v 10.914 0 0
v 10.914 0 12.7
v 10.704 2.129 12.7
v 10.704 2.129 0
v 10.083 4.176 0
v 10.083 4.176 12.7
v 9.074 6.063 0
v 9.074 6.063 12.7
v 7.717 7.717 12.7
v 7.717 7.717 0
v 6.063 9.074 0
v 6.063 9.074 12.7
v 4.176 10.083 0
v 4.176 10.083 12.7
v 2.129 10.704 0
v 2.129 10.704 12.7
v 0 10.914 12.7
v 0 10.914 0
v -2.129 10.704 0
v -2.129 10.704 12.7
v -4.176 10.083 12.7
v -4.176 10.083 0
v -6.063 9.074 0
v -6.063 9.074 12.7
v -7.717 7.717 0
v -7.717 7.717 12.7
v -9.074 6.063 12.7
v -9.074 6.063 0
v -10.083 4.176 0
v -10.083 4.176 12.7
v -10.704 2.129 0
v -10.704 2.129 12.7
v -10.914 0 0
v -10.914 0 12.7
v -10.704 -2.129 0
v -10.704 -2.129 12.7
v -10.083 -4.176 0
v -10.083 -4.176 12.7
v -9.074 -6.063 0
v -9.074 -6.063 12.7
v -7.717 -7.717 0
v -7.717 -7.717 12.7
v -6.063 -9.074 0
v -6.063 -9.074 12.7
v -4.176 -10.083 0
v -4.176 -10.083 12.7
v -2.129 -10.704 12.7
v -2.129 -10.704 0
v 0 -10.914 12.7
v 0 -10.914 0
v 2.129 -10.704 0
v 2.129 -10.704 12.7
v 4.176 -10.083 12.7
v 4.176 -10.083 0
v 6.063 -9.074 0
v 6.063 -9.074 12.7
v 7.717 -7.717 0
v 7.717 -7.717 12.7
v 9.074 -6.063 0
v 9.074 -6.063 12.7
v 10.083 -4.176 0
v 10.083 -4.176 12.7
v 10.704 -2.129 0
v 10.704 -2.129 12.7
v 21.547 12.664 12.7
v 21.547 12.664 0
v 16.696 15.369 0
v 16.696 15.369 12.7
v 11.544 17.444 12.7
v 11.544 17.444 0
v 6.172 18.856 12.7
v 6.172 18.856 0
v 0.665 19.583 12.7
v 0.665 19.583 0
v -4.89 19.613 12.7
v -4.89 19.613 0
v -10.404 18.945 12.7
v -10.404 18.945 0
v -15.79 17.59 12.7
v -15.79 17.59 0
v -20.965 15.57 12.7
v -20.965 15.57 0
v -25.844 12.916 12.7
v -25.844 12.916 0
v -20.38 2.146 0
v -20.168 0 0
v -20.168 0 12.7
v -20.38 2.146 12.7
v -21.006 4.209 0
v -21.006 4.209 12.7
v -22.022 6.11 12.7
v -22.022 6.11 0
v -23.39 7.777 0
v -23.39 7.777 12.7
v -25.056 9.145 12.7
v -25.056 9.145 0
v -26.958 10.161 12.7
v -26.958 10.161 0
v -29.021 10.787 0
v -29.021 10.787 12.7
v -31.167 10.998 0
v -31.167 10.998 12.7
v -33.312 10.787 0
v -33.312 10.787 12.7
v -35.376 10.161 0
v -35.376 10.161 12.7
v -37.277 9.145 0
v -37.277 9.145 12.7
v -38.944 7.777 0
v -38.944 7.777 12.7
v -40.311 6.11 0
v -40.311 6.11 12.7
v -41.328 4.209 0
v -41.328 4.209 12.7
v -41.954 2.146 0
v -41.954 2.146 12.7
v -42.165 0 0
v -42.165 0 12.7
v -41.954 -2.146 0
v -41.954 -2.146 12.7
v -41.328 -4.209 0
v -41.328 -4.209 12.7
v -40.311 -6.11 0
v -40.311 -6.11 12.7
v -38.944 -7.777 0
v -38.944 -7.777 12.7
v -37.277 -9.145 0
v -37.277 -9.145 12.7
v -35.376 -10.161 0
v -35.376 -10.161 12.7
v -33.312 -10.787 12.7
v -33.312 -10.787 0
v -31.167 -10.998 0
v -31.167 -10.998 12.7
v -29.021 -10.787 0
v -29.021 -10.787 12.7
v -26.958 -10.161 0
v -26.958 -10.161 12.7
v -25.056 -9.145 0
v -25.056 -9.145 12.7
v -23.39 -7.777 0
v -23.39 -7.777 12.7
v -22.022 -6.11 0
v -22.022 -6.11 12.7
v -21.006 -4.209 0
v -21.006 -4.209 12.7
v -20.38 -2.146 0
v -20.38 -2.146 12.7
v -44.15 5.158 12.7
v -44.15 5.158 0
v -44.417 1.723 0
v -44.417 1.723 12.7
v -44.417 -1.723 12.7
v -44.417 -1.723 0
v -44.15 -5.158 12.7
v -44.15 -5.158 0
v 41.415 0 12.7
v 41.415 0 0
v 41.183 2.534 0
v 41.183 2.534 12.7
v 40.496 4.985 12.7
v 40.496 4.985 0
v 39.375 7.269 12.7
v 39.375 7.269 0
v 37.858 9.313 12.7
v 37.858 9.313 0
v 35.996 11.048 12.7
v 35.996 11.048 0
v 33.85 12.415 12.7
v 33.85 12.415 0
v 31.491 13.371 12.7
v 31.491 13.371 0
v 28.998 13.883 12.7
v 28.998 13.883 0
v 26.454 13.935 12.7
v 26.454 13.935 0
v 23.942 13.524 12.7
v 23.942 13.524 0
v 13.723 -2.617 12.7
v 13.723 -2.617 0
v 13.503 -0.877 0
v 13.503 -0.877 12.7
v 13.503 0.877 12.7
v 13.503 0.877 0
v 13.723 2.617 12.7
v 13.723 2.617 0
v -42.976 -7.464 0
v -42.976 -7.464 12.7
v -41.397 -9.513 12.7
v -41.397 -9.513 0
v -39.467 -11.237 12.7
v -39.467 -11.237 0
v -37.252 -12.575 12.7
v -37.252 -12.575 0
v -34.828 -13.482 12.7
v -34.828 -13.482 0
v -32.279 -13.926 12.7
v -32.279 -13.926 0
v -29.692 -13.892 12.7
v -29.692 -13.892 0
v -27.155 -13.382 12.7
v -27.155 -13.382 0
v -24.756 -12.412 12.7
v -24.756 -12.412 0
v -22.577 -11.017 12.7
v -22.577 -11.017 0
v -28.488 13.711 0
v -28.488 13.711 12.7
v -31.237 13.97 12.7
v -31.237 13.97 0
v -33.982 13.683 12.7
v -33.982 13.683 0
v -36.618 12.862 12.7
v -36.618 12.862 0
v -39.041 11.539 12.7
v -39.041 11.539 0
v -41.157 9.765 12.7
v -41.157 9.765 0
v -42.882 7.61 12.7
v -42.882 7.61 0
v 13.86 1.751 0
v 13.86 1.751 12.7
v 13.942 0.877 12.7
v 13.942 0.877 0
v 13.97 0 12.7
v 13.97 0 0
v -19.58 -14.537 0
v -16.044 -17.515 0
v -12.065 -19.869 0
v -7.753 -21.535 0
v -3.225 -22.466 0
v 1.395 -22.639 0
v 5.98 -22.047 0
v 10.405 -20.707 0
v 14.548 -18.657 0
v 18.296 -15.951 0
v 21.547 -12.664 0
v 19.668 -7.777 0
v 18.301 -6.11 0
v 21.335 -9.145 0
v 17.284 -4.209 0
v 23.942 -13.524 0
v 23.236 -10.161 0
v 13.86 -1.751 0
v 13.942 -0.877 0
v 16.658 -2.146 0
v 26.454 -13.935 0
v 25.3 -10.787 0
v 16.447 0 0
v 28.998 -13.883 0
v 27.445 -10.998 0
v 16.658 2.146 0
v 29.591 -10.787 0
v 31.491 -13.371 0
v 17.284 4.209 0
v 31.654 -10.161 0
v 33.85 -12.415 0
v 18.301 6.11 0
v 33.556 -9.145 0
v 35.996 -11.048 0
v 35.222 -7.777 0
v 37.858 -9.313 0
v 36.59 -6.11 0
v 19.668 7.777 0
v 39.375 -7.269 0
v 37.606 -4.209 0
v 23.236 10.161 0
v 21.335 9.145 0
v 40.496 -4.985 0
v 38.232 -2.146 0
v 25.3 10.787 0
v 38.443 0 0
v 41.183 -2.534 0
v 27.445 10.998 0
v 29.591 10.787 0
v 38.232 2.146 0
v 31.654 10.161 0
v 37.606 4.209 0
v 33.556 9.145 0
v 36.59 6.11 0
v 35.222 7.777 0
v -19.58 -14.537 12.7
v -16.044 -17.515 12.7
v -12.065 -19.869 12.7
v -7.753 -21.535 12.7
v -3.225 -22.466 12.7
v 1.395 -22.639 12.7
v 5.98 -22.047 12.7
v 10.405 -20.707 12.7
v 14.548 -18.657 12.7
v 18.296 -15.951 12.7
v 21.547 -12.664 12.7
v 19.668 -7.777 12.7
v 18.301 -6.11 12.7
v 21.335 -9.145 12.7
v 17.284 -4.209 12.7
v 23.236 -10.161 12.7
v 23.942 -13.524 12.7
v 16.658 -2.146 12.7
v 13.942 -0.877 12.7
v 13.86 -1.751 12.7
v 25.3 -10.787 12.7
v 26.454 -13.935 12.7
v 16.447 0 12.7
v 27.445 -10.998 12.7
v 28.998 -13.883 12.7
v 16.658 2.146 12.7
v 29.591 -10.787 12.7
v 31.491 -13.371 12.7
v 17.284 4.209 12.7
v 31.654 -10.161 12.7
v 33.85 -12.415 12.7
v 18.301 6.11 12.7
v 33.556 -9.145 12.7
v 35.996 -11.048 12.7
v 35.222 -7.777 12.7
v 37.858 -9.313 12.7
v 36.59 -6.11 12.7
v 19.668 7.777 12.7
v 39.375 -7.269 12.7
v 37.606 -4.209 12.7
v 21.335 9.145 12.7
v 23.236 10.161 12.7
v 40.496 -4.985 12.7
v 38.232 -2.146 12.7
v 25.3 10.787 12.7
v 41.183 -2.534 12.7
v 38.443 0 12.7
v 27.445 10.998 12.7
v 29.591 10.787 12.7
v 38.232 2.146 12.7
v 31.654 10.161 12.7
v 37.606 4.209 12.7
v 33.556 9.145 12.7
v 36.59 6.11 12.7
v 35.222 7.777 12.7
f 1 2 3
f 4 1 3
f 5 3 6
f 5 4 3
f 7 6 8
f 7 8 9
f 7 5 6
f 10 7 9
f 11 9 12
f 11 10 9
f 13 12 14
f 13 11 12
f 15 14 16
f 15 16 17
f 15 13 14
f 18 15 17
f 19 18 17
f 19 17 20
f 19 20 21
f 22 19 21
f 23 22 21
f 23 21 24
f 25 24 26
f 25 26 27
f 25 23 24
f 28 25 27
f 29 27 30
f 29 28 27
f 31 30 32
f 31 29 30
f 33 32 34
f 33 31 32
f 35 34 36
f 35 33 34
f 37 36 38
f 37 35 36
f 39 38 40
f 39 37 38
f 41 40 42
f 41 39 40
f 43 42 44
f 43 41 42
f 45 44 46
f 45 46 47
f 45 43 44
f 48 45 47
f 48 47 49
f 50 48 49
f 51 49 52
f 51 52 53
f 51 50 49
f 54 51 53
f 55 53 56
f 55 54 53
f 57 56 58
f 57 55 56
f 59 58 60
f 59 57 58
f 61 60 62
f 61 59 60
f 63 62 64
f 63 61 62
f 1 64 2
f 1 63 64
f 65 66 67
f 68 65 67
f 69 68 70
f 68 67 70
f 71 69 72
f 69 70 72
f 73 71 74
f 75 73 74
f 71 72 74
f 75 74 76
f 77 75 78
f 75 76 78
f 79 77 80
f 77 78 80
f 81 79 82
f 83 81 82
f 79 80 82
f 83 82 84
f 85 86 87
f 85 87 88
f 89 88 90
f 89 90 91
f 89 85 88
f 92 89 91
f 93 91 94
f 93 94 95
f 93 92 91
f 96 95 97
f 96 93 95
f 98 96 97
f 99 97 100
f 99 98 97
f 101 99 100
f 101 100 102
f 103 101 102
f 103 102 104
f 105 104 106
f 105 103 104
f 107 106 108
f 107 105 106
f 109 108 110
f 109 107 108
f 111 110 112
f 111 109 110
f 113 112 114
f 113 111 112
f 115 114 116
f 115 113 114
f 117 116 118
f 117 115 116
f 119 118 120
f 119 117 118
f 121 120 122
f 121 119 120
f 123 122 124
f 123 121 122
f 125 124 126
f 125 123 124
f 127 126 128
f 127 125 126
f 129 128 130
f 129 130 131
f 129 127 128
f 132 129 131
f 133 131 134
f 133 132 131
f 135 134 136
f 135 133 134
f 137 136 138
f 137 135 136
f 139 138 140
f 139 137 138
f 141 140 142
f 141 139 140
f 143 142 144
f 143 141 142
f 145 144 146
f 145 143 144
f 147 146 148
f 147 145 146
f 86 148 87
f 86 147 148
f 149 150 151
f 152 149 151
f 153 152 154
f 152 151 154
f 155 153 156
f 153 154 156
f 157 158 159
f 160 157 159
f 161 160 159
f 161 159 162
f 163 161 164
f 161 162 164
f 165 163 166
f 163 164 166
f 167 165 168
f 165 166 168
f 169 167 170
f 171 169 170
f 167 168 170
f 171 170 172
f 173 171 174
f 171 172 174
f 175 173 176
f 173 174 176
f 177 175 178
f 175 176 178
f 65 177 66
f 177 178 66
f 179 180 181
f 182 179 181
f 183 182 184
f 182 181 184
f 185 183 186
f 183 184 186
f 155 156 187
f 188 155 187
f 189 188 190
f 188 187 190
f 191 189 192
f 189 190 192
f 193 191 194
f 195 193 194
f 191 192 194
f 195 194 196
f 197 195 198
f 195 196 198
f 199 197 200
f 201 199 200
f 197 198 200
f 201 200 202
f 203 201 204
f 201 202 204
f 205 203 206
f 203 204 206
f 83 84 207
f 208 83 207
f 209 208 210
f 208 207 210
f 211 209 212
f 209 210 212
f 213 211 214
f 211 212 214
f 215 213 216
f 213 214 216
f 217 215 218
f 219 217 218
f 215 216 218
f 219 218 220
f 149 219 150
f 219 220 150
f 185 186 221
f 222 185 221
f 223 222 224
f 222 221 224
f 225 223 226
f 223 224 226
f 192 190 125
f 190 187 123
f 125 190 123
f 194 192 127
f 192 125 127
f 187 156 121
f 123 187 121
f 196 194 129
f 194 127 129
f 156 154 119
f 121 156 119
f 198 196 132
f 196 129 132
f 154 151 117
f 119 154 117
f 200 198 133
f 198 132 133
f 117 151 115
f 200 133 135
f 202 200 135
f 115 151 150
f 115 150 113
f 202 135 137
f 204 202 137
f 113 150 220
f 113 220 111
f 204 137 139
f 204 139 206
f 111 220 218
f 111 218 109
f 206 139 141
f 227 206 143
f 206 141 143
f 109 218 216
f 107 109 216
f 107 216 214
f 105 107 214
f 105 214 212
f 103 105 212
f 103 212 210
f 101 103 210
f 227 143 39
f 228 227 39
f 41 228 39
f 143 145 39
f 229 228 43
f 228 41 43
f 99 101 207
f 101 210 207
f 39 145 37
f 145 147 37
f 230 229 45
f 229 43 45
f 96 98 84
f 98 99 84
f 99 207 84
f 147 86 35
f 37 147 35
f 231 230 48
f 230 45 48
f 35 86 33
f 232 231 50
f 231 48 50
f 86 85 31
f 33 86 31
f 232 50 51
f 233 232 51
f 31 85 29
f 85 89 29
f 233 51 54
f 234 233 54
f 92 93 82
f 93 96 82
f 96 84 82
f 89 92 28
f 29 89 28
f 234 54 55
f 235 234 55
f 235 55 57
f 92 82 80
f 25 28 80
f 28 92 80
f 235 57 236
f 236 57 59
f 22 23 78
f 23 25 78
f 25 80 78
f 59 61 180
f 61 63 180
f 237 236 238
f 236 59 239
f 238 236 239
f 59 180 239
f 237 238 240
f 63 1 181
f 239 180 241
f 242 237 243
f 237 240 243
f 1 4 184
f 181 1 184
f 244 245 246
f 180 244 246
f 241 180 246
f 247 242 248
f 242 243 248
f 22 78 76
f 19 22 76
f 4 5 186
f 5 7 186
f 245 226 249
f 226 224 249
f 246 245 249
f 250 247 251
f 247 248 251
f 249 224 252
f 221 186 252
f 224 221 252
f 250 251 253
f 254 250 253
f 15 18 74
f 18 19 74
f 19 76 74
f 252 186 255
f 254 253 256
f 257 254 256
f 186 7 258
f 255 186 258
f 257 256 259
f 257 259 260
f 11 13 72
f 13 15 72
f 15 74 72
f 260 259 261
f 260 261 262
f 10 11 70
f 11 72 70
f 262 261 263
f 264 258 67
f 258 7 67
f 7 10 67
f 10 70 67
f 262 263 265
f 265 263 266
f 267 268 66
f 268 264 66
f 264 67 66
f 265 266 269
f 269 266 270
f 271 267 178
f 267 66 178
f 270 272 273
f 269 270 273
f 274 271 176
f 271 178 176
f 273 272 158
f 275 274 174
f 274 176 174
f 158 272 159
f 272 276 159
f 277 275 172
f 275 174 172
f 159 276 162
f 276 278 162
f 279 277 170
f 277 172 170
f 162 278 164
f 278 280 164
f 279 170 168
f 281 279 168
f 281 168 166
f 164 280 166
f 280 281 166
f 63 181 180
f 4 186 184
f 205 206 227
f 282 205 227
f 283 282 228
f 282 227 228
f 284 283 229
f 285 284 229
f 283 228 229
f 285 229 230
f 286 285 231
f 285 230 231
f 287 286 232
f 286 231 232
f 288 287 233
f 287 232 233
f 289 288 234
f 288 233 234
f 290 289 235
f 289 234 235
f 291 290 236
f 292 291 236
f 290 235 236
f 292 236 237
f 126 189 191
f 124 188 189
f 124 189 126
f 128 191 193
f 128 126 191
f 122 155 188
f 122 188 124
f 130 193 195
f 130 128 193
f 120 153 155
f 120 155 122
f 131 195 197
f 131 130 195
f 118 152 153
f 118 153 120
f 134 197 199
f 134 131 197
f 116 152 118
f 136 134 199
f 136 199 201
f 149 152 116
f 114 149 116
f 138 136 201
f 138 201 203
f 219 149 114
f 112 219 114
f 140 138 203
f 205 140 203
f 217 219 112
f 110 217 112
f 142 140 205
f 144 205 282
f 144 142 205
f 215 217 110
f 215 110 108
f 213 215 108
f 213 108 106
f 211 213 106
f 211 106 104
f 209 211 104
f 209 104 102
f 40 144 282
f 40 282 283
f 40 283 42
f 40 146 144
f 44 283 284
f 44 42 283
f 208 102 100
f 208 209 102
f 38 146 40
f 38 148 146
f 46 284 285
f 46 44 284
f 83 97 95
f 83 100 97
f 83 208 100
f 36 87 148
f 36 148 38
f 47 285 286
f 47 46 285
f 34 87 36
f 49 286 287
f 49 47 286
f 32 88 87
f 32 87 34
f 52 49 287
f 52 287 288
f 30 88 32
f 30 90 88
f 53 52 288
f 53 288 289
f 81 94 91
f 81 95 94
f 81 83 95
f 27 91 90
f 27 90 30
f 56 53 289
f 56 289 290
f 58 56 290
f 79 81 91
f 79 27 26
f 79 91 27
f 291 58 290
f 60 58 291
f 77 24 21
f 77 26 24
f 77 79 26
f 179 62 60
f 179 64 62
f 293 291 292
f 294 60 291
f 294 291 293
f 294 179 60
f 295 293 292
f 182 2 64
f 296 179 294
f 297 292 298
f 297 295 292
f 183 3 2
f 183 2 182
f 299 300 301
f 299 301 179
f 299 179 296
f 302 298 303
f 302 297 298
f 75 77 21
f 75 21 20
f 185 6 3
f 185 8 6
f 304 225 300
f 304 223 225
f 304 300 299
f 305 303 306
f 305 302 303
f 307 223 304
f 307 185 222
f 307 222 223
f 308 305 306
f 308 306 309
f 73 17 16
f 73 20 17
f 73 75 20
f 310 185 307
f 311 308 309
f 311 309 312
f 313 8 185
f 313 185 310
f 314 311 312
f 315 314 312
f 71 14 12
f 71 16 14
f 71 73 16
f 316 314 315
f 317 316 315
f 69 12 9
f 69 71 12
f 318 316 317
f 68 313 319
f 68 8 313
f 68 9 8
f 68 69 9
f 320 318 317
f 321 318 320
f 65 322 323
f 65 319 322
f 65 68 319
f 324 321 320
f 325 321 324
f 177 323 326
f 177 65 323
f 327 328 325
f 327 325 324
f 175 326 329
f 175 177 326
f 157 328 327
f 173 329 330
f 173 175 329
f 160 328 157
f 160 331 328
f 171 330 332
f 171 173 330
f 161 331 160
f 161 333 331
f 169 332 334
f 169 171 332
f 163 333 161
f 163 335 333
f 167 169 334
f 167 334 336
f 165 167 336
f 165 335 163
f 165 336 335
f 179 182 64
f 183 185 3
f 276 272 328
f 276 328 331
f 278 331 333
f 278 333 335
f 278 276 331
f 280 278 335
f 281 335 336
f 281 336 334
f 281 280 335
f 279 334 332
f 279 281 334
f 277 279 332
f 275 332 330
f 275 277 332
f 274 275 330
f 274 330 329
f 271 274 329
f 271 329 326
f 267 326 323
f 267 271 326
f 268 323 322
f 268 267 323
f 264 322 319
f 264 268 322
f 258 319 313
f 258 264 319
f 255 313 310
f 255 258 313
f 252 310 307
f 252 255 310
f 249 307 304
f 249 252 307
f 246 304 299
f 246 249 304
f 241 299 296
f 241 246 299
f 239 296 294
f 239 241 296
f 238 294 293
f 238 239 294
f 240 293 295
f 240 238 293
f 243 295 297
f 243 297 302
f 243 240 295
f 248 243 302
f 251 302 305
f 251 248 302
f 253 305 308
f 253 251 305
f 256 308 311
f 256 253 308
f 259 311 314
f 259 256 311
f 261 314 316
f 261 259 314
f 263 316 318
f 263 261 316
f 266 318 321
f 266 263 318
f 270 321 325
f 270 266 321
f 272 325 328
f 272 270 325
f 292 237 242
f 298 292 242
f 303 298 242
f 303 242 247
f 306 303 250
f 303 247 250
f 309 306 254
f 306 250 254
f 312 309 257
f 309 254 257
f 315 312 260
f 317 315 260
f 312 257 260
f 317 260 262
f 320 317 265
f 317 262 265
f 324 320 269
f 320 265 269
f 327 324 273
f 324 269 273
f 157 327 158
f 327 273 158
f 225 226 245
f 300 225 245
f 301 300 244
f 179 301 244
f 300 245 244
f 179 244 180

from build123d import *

# Parameters (mm, degrees)
F0_R     = 10.9982
F0_R_2   = 10.9137143354
F1_DEPTH = 12.7


with BuildPart() as f1:
    # F0 (on Top) → F1 (new body)
    with BuildSketch(Plane.XY):
        with BuildLine():
            ThreePointArc((-25.8441113636, 12.9163114686), (-36.6183263022, 12.8623681815), (-44.1497681666, 5.1575644288))
            ThreePointArc((-44.1497681666, 5.1575644288), (-44.45, 0), (-44.1497681666, -5.1575644288))
            ThreePointArc((-44.1497681666, -5.1575644288), (-34.8282447282, -13.4816128788), (-22.5765010853, -11.016788439))
            ThreePointArc((-22.5765010853, -11.016788439), (-18.6134833709, -6.13009055), (-17.1966857451, 0))
            ThreePointArc((-17.1966857451, 0), (-19.5581271759, 7.7718895994), (-25.8441113636, 12.9163114686))
        make_face()
        with Locations((-31.1666857451, 0)):
            Circle(F0_R, mode=Mode.SUBTRACT)
        with BuildLine():
            ThreePointArc((13.7226451188, -2.6172334521), (13.4752902377, 0), (13.7226451188, 2.6172334521))
            ThreePointArc((13.7226451188, 2.6172334521), (-13.97, 0), (13.7226451188, -2.6172334521))
        make_face()
        Circle(F0_R_2, mode=Mode.SUBTRACT)
        with BuildLine():
            ThreePointArc((41.4152902377, 0), (34.9539662549, 11.7805214005), (21.5469030554, 12.6637249121))
            ThreePointArc((21.5469030554, 12.6637249121), (16.4235288175, 8.583803073), (13.7226451188, 2.6172334521))
            ThreePointArc((13.7226451188, 2.6172334521), (13.9080238048, 1.3144481142), (13.97, 0))
            ThreePointArc((13.97, 0), (13.9080238048, -1.3144481142), (13.7226451188, -2.6172334521))
            ThreePointArc((13.7226451188, -2.6172334521), (16.4235288175, -8.583803073), (21.5469030554, -12.6637249121))
            ThreePointArc((21.5469030554, -12.6637249121), (34.9539662549, -11.7805214005), (41.4152902377, 0))
        make_face()
        with Locations((27.4452902377, 0)):
            Circle(F0_R, mode=Mode.SUBTRACT)
        with BuildLine():
            ThreePointArc((21.5469030554, 12.6637249121), (-2.1118543996, 19.6851125626), (-25.8441113636, 12.9163114686))
            ThreePointArc((-25.8441113636, 12.9163114686), (-19.5581271759, 7.7718895994), (-17.1966857451, 0))
            ThreePointArc((-17.1966857451, 0), (-18.6134833709, -6.13009055), (-22.5765010853, -11.016788439))
            ThreePointArc((-22.5765010853, -11.016788439), (-0.9182159345, -22.6482799794), (21.5469030554, -12.6637249121))
            ThreePointArc((21.5469030554, -12.6637249121), (16.4235288175, -8.583803073), (13.7226451188, -2.6172334521))
            ThreePointArc((13.7226451188, -2.6172334521), (-13.97, 0), (13.7226451188, 2.6172334521))
            ThreePointArc((13.7226451188, 2.6172334521), (16.4235288175, 8.583803073), (21.5469030554, 12.6637249121))
        make_face()
    extrude(amount=F1_DEPTH)


solid = f1.part
